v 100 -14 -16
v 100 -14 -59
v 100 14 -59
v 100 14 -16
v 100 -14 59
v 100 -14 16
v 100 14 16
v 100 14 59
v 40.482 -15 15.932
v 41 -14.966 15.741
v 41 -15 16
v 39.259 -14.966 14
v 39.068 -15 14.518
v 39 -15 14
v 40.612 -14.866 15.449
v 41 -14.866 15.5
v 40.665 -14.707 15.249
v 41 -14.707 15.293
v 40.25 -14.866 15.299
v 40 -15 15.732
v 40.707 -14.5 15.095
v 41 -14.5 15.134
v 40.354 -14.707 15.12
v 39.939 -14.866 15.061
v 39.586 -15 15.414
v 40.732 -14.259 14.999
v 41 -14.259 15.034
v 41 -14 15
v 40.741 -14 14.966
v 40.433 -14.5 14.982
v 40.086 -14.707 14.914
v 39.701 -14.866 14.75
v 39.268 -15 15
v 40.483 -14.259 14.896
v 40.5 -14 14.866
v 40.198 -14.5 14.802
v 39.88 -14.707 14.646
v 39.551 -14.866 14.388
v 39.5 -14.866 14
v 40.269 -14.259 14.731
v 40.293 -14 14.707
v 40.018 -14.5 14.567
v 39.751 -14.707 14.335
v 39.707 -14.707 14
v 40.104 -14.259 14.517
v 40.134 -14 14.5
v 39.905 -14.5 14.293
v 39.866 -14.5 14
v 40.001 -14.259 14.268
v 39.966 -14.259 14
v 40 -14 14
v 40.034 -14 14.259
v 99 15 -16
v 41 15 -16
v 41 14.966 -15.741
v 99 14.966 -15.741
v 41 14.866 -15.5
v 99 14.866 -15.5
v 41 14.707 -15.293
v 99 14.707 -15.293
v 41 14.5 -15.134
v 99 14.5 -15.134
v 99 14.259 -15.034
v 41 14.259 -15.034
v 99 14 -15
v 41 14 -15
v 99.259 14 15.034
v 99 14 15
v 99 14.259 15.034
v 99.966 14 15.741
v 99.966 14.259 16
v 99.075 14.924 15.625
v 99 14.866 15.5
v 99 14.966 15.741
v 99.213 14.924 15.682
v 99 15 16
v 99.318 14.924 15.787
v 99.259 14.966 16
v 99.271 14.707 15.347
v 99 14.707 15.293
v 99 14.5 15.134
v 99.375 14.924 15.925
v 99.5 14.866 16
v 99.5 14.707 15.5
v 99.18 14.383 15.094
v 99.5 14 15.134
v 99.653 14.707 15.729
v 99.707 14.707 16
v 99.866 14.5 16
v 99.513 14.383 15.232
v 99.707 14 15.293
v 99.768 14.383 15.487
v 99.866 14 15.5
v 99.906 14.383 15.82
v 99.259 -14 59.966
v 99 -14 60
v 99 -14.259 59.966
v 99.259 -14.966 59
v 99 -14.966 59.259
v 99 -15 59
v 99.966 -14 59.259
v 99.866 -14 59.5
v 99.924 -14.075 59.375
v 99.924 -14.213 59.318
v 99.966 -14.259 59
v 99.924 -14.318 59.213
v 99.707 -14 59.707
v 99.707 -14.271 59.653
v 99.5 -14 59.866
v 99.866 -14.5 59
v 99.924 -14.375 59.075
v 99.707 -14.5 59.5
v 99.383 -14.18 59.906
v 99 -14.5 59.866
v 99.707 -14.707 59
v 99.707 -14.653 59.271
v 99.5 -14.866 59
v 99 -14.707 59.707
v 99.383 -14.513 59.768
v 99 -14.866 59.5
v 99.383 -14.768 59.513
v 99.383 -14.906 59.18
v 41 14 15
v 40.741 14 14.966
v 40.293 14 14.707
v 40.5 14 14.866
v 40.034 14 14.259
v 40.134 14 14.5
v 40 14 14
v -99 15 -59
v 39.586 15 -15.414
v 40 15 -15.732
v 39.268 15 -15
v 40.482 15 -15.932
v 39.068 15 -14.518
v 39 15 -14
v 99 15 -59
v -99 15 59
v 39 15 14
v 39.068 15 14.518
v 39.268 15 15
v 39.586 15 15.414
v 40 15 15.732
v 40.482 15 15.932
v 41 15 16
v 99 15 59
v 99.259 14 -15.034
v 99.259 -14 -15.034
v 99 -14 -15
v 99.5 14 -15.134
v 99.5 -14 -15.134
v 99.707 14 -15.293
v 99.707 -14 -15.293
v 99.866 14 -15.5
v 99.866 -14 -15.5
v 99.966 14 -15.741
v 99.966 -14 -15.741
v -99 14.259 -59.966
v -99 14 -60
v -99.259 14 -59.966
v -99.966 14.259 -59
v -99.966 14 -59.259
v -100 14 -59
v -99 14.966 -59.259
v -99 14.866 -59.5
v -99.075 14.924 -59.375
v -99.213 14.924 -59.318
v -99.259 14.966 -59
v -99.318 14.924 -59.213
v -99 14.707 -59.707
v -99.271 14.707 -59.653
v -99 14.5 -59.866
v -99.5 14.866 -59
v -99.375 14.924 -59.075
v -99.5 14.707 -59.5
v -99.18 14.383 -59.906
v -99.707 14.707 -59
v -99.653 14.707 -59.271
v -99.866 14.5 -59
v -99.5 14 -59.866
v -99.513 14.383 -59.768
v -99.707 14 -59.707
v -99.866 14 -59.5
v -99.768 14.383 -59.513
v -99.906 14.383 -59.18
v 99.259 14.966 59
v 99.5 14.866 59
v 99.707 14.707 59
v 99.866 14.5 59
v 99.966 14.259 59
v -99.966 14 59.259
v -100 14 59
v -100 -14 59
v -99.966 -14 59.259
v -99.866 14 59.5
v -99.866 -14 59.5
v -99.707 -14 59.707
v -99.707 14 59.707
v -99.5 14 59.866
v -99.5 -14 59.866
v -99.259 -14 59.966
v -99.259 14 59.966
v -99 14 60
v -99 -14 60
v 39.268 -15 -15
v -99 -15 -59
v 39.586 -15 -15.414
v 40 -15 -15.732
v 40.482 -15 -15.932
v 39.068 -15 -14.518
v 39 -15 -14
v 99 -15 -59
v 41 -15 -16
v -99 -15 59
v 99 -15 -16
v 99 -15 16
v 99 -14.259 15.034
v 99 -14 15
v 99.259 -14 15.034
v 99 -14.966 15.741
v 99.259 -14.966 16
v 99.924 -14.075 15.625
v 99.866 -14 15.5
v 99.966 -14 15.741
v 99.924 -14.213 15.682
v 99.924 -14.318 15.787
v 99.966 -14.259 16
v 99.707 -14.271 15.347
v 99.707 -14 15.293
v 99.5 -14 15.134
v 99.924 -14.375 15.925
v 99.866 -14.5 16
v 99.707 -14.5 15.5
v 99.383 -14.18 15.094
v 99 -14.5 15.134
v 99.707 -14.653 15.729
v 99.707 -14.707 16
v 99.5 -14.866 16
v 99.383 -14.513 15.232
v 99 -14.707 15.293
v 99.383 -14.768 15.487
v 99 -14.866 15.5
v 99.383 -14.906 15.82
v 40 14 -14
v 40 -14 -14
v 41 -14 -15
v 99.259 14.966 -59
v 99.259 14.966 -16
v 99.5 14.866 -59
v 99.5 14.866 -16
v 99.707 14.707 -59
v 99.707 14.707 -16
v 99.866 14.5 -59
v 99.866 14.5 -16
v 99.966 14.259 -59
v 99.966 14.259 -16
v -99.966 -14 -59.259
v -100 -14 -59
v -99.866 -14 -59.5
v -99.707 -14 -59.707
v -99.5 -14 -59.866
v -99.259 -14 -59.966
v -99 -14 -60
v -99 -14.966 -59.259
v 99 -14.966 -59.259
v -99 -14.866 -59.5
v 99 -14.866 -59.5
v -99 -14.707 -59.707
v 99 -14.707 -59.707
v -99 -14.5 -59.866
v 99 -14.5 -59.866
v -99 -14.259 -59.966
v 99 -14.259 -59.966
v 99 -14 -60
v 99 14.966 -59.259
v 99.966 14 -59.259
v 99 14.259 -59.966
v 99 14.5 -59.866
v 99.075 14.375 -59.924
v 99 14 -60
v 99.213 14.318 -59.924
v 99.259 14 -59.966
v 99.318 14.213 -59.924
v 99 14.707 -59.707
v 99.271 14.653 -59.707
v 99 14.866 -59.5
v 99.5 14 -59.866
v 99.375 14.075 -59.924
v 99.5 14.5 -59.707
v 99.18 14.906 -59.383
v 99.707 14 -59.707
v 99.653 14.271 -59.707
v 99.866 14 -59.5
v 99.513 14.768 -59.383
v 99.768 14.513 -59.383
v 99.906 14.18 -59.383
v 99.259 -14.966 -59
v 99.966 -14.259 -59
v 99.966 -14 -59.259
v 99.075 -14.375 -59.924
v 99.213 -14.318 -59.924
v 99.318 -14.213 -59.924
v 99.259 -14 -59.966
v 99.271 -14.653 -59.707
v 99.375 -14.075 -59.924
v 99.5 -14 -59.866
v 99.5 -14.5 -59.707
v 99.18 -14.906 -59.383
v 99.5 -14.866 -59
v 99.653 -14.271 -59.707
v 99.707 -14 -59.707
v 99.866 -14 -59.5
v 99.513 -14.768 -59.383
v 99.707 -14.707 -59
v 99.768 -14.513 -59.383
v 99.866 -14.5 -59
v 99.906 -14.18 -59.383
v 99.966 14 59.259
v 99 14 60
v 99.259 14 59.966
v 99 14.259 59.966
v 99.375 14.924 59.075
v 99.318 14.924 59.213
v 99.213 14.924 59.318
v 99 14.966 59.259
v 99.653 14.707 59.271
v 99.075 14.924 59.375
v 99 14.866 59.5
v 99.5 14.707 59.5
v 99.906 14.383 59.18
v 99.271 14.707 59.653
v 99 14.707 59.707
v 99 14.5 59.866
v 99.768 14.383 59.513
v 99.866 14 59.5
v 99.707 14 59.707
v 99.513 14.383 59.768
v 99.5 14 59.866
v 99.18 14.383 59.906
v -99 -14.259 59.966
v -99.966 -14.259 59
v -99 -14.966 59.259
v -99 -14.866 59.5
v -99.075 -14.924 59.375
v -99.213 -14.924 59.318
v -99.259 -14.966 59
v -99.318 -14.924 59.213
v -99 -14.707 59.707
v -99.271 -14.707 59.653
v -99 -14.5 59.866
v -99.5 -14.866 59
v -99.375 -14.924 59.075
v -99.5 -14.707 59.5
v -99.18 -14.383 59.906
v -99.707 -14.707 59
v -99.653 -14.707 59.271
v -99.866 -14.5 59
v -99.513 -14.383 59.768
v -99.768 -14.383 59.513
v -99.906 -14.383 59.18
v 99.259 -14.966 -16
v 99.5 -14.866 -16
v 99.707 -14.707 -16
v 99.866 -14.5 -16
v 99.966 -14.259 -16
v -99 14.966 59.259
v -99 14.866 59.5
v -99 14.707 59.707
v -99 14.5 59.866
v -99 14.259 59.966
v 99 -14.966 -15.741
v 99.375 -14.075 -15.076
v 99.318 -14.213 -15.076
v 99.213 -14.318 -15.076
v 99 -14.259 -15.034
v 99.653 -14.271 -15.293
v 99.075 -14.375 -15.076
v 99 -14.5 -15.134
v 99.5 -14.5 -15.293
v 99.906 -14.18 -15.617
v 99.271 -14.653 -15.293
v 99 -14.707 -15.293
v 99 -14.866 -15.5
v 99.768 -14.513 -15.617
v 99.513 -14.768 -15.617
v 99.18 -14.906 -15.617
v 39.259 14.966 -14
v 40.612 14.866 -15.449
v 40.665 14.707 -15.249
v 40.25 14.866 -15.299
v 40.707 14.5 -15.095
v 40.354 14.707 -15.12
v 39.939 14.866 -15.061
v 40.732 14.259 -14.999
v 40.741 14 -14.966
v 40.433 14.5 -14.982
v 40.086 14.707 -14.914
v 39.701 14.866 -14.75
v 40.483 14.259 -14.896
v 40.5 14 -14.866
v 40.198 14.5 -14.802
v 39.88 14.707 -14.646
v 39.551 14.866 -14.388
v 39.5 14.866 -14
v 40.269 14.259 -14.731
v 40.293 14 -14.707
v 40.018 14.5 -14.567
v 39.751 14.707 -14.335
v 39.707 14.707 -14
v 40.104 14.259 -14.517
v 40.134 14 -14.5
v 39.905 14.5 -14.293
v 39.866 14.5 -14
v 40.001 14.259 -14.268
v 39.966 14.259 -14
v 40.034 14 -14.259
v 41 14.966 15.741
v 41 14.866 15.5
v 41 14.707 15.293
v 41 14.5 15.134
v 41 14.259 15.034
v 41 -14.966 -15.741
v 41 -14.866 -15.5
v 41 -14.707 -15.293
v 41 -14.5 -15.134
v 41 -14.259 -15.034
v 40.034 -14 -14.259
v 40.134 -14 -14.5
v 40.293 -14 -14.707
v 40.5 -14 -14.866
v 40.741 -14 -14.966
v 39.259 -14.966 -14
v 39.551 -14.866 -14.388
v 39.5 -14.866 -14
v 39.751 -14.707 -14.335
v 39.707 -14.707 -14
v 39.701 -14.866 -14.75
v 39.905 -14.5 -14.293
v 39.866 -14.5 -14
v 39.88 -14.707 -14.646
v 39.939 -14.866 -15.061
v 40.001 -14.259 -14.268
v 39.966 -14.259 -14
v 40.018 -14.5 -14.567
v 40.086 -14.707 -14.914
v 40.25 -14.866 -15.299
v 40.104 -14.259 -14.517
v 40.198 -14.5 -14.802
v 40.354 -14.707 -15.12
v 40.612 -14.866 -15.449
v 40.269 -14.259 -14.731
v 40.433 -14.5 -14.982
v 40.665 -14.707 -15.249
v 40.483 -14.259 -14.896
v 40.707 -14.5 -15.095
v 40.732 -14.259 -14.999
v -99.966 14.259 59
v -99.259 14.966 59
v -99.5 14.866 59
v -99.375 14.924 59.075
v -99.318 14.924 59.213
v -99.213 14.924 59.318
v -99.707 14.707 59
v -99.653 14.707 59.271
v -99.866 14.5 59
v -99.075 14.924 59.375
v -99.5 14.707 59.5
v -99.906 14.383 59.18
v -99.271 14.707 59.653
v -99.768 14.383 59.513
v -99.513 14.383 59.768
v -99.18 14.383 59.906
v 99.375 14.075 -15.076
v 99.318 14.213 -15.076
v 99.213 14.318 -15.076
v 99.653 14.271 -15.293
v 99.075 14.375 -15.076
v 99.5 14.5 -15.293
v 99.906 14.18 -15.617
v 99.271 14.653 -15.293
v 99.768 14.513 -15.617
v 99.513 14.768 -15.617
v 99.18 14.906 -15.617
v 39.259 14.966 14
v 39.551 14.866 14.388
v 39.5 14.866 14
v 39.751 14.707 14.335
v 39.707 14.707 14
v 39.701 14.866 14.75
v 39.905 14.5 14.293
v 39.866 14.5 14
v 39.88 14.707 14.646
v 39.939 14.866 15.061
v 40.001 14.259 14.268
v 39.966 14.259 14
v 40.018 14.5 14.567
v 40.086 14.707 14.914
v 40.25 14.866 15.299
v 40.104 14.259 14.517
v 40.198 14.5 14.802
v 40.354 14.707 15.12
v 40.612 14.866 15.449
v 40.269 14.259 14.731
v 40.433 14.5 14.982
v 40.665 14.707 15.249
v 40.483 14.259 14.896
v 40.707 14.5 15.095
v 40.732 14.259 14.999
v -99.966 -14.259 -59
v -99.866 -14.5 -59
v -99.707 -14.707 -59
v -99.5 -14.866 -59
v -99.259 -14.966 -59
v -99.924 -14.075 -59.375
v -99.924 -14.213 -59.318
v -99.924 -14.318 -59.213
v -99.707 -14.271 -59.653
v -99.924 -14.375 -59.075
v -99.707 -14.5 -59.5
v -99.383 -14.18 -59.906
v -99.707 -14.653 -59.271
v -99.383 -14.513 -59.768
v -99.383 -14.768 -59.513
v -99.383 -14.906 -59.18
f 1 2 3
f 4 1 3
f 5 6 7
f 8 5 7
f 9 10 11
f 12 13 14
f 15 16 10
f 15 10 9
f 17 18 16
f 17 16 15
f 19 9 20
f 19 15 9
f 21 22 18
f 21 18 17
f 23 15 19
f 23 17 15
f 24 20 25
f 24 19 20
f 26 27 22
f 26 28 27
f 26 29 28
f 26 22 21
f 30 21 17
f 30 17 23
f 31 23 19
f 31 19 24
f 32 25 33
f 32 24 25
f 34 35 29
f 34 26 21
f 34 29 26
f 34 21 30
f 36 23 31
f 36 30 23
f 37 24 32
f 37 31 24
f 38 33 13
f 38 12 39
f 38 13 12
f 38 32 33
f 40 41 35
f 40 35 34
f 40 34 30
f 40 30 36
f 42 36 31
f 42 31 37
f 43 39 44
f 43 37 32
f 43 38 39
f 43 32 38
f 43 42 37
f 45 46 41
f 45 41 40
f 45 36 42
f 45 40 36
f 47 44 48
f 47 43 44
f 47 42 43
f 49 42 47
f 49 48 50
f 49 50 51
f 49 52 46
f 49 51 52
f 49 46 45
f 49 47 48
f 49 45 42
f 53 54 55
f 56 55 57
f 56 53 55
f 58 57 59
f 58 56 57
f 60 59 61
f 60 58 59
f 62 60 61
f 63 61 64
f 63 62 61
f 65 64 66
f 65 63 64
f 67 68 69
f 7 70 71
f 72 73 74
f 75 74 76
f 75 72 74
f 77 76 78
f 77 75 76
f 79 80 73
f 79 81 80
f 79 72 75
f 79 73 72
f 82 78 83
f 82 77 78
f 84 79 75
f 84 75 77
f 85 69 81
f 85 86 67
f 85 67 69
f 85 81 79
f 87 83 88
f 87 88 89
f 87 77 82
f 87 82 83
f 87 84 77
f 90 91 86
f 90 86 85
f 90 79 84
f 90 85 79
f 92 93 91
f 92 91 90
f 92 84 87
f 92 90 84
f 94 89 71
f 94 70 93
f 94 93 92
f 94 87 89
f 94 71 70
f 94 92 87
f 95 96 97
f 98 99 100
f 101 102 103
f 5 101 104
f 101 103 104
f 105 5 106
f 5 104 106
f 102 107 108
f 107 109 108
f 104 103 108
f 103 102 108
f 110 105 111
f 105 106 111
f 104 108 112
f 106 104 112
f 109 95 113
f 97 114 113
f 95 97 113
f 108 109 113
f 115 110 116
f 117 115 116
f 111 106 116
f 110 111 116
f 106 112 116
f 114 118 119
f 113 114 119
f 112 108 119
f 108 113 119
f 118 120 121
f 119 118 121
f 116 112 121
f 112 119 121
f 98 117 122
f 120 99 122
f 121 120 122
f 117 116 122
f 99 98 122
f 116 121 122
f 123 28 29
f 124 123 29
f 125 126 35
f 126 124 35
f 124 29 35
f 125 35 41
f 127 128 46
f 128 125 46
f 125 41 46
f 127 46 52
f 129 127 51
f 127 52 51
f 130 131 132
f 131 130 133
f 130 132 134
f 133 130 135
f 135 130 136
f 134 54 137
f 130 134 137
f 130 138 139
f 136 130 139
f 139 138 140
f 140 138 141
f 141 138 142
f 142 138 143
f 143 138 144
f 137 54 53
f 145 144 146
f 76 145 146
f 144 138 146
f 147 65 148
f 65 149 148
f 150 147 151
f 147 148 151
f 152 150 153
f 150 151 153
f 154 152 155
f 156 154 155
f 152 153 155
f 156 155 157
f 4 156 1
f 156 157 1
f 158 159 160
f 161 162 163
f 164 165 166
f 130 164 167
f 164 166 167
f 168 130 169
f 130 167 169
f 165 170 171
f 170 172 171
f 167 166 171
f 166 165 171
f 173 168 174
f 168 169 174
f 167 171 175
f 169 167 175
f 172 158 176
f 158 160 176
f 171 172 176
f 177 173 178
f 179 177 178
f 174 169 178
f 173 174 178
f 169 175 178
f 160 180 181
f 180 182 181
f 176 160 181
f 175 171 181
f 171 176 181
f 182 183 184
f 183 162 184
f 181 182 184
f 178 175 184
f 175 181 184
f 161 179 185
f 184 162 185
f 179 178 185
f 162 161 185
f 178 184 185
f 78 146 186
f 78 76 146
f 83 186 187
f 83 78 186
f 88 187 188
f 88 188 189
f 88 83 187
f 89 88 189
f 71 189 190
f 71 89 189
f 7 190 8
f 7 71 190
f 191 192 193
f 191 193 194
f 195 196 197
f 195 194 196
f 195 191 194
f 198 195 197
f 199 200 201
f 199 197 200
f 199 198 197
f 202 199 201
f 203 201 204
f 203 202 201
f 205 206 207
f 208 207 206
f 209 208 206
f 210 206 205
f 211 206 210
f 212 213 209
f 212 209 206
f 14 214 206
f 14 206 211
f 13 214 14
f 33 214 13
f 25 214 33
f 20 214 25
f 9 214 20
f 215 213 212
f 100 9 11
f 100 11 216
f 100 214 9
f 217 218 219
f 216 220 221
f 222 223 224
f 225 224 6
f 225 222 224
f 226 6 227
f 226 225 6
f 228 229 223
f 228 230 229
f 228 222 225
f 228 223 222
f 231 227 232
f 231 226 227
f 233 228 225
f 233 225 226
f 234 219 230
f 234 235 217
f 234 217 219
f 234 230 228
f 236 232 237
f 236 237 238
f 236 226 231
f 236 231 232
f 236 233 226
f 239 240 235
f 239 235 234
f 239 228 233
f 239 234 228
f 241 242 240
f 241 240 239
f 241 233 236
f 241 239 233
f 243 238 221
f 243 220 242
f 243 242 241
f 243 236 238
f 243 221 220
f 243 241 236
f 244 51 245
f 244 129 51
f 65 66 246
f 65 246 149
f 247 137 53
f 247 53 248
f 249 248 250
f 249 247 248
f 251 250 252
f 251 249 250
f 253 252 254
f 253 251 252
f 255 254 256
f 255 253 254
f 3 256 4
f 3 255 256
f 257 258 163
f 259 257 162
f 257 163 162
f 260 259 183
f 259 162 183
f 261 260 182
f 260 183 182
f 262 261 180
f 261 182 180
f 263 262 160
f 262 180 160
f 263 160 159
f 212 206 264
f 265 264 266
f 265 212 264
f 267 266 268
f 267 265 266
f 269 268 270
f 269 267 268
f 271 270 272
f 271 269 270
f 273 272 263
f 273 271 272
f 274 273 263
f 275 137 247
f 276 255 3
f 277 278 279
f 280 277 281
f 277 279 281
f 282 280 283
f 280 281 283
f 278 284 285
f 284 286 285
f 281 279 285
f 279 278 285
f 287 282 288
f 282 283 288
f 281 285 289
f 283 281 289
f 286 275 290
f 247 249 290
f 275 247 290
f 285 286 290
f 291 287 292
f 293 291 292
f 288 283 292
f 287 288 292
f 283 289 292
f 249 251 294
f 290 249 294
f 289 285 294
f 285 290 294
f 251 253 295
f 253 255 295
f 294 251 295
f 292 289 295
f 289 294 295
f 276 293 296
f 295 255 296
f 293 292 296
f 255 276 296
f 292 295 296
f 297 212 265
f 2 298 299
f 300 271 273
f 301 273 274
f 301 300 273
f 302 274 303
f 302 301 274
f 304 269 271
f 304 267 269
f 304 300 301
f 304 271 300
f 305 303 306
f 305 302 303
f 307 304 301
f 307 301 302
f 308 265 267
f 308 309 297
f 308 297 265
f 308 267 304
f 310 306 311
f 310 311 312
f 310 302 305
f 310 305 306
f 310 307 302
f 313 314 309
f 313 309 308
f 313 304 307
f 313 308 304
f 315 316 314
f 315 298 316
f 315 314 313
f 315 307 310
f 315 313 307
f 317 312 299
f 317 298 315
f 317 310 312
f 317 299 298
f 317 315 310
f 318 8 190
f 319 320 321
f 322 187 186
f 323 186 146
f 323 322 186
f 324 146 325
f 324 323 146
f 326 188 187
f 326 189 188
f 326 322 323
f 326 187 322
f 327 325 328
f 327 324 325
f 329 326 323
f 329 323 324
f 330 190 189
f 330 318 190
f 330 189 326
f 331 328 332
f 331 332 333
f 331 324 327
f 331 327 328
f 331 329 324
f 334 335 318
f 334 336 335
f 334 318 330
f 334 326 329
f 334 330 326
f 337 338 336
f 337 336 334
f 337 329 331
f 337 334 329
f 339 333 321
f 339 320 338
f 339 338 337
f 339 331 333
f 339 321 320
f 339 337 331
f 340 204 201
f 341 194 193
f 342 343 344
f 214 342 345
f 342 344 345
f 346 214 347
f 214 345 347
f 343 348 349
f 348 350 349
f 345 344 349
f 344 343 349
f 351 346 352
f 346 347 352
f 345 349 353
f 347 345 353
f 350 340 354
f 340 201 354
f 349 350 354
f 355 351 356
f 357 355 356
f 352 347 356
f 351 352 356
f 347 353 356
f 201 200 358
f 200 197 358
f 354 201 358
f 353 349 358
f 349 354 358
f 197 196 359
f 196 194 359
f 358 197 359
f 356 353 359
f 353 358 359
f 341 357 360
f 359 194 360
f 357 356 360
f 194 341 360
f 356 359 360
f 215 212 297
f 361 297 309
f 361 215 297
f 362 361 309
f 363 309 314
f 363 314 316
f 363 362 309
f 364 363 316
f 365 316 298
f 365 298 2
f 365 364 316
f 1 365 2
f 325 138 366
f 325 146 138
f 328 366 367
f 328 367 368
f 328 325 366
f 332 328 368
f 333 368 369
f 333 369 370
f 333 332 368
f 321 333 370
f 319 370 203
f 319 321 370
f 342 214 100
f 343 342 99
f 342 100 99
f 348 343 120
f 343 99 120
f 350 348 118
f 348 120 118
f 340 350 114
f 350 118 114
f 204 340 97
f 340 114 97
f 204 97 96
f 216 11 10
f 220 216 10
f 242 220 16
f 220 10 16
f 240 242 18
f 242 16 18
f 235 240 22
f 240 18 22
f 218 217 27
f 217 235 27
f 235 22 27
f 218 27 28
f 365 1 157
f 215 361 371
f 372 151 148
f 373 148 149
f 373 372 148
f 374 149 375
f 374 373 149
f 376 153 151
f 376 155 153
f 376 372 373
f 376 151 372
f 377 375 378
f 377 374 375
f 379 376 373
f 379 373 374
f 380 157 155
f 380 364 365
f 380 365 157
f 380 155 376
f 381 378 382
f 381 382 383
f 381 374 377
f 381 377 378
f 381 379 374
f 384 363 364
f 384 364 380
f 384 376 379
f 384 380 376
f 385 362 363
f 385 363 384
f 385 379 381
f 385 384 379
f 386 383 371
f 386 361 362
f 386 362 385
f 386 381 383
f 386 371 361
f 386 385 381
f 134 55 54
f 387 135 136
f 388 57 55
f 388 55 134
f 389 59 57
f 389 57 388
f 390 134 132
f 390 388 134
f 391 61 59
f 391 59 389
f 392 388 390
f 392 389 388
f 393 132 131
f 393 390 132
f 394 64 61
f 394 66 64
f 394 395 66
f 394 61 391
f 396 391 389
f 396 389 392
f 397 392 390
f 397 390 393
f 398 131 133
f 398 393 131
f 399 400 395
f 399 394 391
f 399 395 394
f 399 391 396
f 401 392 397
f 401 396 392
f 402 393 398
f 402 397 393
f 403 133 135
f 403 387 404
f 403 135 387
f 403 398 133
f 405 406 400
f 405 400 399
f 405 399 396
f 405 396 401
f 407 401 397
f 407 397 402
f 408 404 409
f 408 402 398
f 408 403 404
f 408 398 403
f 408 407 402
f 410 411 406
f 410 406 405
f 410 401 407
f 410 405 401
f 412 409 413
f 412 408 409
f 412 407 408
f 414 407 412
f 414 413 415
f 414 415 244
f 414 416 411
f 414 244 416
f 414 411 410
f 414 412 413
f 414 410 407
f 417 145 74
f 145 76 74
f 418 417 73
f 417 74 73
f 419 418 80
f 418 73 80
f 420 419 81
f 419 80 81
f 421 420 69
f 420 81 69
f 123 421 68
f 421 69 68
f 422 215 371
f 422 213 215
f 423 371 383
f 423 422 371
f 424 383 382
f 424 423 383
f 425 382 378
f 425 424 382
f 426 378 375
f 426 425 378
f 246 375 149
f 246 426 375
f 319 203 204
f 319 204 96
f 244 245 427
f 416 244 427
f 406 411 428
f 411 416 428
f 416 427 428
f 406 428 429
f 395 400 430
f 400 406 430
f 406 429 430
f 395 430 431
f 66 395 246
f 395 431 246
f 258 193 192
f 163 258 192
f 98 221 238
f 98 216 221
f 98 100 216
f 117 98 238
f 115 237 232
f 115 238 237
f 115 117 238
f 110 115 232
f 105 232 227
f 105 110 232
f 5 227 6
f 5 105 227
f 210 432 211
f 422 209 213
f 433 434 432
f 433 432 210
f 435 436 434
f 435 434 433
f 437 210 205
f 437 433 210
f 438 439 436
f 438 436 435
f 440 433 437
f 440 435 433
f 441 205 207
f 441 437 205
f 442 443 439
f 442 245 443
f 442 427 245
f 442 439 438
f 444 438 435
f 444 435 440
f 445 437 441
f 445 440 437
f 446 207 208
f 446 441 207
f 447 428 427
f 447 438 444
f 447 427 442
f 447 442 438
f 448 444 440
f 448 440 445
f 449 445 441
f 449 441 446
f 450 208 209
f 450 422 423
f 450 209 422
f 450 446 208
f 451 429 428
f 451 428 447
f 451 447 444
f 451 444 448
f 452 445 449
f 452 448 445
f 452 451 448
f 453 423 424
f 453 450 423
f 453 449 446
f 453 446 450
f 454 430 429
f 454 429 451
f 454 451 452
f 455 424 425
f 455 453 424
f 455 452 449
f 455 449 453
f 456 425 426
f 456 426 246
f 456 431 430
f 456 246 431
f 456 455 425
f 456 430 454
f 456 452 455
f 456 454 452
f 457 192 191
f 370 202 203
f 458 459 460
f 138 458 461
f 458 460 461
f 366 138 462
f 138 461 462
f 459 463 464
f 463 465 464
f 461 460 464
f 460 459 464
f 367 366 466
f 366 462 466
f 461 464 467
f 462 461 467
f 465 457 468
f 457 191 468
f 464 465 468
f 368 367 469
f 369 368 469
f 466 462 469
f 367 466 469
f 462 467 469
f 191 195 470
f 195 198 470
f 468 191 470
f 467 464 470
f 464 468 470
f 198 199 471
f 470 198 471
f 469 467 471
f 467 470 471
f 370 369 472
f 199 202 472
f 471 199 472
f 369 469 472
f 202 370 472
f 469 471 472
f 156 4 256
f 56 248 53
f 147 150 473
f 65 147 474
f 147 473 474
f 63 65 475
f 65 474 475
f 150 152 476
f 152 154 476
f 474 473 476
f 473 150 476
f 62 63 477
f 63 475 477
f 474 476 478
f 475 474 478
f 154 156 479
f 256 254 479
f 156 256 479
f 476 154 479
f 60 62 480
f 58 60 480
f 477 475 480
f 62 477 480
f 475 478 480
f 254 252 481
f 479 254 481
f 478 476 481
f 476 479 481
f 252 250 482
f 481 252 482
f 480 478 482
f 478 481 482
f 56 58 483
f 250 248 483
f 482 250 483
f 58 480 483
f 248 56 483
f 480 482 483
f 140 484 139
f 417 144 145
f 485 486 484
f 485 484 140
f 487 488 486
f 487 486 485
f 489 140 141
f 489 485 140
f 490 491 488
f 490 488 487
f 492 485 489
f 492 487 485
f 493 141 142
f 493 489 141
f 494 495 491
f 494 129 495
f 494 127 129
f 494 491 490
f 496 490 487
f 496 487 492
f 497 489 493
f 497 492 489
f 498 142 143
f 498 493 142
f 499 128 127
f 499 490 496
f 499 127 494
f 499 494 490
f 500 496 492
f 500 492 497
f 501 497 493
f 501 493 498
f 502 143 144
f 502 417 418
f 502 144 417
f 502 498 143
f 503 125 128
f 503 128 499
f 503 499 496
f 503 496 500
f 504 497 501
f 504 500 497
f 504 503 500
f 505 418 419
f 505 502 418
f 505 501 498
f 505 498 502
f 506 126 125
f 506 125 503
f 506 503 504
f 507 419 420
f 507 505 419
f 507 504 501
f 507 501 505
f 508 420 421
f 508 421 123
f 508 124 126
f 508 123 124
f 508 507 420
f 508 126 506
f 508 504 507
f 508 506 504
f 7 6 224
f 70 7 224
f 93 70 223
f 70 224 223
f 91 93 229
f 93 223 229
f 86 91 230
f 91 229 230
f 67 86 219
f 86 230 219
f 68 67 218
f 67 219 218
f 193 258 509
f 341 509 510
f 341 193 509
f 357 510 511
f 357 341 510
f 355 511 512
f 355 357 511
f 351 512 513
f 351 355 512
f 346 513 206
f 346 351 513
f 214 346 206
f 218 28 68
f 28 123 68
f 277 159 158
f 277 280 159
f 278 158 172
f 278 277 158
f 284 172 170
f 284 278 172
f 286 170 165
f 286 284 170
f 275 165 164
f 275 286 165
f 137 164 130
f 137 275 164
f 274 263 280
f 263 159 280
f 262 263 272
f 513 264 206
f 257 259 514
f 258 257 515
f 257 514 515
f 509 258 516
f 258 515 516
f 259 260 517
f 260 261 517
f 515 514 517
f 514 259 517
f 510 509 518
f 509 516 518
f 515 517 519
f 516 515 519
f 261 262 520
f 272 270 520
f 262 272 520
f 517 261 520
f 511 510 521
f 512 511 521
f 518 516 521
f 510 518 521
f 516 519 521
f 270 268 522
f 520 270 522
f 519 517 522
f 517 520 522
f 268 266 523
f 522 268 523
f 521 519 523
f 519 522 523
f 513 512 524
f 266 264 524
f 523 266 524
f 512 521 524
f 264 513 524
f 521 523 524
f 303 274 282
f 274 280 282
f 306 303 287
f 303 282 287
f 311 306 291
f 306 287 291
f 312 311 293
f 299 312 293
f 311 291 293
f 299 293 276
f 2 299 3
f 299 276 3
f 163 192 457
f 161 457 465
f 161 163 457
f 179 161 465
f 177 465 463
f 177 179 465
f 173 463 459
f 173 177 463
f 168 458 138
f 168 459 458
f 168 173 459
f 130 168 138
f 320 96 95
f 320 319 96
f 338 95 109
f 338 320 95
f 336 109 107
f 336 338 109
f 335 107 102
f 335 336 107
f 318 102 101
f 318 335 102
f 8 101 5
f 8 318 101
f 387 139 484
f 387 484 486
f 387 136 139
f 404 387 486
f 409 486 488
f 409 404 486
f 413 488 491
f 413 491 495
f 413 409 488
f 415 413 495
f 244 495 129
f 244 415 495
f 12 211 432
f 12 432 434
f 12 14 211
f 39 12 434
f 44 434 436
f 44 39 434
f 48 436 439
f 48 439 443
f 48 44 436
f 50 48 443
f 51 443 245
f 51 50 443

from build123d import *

# Parameters (mm, degrees)
SKETCH1_W           = 200
SKETCH1_H           = 30
BOSS_EXTRUDE1_DEPTH = 60
SKETCH2_W           = 60
SKETCH2_H           = 30
CUT_EXTRUDE2_DEPTH  = 121.415945788
FILLET1_R           = 1


with BuildPart() as part:
    # Sketch1 → Boss-Extrude1 (new, symmetric)
    with BuildSketch(Plane.XY):
        Rectangle(SKETCH1_W, SKETCH1_H)
    extrude(amount=BOSS_EXTRUDE1_DEPTH, both=True)

    # Sketch2 → Cut-Extrude2 (cut, through all)
    with BuildSketch(Plane(origin=(0, 15, 0), x_dir=(1, 0, 0), z_dir=(0, 1, 0))):
        with Locations((70, 0)):
            Rectangle(SKETCH2_W, SKETCH2_H)
    extrude(amount=-CUT_EXTRUDE2_DEPTH, mode=Mode.SUBTRACT)

    # Fillet1
    fillet1_edges = [part.edges().sort_by_distance(p)[0] for p in [
        (-100, 0, 60),
        (100, -15, -37.5),
        (100, 15, -37.5),
        (0, -15, 60),
        (100, 0, -15),
        (70, -15, 15),
        (100, 0, 15),
        (40, -15, 0),
        (40, 0, 15),
        (70, -15, -15),
        (40, 0, -15),
        (70, 15, -15),
        (40, 15, 0),
        (70, 15, 15),
        (100, 0, 60),
        (0, -15, -60),
        (-100, 0, -60),
        (0, 15, -60),
        (100, 0, -60),
        (100, -15, 37.5),
        (-100, -15, 0),
        (-100, 15, 0),
        (100, 15, 37.5),
        (0, 15, 60),
    ]]
    fillet(fillet1_edges, radius=FILLET1_R)


solid = part.part
